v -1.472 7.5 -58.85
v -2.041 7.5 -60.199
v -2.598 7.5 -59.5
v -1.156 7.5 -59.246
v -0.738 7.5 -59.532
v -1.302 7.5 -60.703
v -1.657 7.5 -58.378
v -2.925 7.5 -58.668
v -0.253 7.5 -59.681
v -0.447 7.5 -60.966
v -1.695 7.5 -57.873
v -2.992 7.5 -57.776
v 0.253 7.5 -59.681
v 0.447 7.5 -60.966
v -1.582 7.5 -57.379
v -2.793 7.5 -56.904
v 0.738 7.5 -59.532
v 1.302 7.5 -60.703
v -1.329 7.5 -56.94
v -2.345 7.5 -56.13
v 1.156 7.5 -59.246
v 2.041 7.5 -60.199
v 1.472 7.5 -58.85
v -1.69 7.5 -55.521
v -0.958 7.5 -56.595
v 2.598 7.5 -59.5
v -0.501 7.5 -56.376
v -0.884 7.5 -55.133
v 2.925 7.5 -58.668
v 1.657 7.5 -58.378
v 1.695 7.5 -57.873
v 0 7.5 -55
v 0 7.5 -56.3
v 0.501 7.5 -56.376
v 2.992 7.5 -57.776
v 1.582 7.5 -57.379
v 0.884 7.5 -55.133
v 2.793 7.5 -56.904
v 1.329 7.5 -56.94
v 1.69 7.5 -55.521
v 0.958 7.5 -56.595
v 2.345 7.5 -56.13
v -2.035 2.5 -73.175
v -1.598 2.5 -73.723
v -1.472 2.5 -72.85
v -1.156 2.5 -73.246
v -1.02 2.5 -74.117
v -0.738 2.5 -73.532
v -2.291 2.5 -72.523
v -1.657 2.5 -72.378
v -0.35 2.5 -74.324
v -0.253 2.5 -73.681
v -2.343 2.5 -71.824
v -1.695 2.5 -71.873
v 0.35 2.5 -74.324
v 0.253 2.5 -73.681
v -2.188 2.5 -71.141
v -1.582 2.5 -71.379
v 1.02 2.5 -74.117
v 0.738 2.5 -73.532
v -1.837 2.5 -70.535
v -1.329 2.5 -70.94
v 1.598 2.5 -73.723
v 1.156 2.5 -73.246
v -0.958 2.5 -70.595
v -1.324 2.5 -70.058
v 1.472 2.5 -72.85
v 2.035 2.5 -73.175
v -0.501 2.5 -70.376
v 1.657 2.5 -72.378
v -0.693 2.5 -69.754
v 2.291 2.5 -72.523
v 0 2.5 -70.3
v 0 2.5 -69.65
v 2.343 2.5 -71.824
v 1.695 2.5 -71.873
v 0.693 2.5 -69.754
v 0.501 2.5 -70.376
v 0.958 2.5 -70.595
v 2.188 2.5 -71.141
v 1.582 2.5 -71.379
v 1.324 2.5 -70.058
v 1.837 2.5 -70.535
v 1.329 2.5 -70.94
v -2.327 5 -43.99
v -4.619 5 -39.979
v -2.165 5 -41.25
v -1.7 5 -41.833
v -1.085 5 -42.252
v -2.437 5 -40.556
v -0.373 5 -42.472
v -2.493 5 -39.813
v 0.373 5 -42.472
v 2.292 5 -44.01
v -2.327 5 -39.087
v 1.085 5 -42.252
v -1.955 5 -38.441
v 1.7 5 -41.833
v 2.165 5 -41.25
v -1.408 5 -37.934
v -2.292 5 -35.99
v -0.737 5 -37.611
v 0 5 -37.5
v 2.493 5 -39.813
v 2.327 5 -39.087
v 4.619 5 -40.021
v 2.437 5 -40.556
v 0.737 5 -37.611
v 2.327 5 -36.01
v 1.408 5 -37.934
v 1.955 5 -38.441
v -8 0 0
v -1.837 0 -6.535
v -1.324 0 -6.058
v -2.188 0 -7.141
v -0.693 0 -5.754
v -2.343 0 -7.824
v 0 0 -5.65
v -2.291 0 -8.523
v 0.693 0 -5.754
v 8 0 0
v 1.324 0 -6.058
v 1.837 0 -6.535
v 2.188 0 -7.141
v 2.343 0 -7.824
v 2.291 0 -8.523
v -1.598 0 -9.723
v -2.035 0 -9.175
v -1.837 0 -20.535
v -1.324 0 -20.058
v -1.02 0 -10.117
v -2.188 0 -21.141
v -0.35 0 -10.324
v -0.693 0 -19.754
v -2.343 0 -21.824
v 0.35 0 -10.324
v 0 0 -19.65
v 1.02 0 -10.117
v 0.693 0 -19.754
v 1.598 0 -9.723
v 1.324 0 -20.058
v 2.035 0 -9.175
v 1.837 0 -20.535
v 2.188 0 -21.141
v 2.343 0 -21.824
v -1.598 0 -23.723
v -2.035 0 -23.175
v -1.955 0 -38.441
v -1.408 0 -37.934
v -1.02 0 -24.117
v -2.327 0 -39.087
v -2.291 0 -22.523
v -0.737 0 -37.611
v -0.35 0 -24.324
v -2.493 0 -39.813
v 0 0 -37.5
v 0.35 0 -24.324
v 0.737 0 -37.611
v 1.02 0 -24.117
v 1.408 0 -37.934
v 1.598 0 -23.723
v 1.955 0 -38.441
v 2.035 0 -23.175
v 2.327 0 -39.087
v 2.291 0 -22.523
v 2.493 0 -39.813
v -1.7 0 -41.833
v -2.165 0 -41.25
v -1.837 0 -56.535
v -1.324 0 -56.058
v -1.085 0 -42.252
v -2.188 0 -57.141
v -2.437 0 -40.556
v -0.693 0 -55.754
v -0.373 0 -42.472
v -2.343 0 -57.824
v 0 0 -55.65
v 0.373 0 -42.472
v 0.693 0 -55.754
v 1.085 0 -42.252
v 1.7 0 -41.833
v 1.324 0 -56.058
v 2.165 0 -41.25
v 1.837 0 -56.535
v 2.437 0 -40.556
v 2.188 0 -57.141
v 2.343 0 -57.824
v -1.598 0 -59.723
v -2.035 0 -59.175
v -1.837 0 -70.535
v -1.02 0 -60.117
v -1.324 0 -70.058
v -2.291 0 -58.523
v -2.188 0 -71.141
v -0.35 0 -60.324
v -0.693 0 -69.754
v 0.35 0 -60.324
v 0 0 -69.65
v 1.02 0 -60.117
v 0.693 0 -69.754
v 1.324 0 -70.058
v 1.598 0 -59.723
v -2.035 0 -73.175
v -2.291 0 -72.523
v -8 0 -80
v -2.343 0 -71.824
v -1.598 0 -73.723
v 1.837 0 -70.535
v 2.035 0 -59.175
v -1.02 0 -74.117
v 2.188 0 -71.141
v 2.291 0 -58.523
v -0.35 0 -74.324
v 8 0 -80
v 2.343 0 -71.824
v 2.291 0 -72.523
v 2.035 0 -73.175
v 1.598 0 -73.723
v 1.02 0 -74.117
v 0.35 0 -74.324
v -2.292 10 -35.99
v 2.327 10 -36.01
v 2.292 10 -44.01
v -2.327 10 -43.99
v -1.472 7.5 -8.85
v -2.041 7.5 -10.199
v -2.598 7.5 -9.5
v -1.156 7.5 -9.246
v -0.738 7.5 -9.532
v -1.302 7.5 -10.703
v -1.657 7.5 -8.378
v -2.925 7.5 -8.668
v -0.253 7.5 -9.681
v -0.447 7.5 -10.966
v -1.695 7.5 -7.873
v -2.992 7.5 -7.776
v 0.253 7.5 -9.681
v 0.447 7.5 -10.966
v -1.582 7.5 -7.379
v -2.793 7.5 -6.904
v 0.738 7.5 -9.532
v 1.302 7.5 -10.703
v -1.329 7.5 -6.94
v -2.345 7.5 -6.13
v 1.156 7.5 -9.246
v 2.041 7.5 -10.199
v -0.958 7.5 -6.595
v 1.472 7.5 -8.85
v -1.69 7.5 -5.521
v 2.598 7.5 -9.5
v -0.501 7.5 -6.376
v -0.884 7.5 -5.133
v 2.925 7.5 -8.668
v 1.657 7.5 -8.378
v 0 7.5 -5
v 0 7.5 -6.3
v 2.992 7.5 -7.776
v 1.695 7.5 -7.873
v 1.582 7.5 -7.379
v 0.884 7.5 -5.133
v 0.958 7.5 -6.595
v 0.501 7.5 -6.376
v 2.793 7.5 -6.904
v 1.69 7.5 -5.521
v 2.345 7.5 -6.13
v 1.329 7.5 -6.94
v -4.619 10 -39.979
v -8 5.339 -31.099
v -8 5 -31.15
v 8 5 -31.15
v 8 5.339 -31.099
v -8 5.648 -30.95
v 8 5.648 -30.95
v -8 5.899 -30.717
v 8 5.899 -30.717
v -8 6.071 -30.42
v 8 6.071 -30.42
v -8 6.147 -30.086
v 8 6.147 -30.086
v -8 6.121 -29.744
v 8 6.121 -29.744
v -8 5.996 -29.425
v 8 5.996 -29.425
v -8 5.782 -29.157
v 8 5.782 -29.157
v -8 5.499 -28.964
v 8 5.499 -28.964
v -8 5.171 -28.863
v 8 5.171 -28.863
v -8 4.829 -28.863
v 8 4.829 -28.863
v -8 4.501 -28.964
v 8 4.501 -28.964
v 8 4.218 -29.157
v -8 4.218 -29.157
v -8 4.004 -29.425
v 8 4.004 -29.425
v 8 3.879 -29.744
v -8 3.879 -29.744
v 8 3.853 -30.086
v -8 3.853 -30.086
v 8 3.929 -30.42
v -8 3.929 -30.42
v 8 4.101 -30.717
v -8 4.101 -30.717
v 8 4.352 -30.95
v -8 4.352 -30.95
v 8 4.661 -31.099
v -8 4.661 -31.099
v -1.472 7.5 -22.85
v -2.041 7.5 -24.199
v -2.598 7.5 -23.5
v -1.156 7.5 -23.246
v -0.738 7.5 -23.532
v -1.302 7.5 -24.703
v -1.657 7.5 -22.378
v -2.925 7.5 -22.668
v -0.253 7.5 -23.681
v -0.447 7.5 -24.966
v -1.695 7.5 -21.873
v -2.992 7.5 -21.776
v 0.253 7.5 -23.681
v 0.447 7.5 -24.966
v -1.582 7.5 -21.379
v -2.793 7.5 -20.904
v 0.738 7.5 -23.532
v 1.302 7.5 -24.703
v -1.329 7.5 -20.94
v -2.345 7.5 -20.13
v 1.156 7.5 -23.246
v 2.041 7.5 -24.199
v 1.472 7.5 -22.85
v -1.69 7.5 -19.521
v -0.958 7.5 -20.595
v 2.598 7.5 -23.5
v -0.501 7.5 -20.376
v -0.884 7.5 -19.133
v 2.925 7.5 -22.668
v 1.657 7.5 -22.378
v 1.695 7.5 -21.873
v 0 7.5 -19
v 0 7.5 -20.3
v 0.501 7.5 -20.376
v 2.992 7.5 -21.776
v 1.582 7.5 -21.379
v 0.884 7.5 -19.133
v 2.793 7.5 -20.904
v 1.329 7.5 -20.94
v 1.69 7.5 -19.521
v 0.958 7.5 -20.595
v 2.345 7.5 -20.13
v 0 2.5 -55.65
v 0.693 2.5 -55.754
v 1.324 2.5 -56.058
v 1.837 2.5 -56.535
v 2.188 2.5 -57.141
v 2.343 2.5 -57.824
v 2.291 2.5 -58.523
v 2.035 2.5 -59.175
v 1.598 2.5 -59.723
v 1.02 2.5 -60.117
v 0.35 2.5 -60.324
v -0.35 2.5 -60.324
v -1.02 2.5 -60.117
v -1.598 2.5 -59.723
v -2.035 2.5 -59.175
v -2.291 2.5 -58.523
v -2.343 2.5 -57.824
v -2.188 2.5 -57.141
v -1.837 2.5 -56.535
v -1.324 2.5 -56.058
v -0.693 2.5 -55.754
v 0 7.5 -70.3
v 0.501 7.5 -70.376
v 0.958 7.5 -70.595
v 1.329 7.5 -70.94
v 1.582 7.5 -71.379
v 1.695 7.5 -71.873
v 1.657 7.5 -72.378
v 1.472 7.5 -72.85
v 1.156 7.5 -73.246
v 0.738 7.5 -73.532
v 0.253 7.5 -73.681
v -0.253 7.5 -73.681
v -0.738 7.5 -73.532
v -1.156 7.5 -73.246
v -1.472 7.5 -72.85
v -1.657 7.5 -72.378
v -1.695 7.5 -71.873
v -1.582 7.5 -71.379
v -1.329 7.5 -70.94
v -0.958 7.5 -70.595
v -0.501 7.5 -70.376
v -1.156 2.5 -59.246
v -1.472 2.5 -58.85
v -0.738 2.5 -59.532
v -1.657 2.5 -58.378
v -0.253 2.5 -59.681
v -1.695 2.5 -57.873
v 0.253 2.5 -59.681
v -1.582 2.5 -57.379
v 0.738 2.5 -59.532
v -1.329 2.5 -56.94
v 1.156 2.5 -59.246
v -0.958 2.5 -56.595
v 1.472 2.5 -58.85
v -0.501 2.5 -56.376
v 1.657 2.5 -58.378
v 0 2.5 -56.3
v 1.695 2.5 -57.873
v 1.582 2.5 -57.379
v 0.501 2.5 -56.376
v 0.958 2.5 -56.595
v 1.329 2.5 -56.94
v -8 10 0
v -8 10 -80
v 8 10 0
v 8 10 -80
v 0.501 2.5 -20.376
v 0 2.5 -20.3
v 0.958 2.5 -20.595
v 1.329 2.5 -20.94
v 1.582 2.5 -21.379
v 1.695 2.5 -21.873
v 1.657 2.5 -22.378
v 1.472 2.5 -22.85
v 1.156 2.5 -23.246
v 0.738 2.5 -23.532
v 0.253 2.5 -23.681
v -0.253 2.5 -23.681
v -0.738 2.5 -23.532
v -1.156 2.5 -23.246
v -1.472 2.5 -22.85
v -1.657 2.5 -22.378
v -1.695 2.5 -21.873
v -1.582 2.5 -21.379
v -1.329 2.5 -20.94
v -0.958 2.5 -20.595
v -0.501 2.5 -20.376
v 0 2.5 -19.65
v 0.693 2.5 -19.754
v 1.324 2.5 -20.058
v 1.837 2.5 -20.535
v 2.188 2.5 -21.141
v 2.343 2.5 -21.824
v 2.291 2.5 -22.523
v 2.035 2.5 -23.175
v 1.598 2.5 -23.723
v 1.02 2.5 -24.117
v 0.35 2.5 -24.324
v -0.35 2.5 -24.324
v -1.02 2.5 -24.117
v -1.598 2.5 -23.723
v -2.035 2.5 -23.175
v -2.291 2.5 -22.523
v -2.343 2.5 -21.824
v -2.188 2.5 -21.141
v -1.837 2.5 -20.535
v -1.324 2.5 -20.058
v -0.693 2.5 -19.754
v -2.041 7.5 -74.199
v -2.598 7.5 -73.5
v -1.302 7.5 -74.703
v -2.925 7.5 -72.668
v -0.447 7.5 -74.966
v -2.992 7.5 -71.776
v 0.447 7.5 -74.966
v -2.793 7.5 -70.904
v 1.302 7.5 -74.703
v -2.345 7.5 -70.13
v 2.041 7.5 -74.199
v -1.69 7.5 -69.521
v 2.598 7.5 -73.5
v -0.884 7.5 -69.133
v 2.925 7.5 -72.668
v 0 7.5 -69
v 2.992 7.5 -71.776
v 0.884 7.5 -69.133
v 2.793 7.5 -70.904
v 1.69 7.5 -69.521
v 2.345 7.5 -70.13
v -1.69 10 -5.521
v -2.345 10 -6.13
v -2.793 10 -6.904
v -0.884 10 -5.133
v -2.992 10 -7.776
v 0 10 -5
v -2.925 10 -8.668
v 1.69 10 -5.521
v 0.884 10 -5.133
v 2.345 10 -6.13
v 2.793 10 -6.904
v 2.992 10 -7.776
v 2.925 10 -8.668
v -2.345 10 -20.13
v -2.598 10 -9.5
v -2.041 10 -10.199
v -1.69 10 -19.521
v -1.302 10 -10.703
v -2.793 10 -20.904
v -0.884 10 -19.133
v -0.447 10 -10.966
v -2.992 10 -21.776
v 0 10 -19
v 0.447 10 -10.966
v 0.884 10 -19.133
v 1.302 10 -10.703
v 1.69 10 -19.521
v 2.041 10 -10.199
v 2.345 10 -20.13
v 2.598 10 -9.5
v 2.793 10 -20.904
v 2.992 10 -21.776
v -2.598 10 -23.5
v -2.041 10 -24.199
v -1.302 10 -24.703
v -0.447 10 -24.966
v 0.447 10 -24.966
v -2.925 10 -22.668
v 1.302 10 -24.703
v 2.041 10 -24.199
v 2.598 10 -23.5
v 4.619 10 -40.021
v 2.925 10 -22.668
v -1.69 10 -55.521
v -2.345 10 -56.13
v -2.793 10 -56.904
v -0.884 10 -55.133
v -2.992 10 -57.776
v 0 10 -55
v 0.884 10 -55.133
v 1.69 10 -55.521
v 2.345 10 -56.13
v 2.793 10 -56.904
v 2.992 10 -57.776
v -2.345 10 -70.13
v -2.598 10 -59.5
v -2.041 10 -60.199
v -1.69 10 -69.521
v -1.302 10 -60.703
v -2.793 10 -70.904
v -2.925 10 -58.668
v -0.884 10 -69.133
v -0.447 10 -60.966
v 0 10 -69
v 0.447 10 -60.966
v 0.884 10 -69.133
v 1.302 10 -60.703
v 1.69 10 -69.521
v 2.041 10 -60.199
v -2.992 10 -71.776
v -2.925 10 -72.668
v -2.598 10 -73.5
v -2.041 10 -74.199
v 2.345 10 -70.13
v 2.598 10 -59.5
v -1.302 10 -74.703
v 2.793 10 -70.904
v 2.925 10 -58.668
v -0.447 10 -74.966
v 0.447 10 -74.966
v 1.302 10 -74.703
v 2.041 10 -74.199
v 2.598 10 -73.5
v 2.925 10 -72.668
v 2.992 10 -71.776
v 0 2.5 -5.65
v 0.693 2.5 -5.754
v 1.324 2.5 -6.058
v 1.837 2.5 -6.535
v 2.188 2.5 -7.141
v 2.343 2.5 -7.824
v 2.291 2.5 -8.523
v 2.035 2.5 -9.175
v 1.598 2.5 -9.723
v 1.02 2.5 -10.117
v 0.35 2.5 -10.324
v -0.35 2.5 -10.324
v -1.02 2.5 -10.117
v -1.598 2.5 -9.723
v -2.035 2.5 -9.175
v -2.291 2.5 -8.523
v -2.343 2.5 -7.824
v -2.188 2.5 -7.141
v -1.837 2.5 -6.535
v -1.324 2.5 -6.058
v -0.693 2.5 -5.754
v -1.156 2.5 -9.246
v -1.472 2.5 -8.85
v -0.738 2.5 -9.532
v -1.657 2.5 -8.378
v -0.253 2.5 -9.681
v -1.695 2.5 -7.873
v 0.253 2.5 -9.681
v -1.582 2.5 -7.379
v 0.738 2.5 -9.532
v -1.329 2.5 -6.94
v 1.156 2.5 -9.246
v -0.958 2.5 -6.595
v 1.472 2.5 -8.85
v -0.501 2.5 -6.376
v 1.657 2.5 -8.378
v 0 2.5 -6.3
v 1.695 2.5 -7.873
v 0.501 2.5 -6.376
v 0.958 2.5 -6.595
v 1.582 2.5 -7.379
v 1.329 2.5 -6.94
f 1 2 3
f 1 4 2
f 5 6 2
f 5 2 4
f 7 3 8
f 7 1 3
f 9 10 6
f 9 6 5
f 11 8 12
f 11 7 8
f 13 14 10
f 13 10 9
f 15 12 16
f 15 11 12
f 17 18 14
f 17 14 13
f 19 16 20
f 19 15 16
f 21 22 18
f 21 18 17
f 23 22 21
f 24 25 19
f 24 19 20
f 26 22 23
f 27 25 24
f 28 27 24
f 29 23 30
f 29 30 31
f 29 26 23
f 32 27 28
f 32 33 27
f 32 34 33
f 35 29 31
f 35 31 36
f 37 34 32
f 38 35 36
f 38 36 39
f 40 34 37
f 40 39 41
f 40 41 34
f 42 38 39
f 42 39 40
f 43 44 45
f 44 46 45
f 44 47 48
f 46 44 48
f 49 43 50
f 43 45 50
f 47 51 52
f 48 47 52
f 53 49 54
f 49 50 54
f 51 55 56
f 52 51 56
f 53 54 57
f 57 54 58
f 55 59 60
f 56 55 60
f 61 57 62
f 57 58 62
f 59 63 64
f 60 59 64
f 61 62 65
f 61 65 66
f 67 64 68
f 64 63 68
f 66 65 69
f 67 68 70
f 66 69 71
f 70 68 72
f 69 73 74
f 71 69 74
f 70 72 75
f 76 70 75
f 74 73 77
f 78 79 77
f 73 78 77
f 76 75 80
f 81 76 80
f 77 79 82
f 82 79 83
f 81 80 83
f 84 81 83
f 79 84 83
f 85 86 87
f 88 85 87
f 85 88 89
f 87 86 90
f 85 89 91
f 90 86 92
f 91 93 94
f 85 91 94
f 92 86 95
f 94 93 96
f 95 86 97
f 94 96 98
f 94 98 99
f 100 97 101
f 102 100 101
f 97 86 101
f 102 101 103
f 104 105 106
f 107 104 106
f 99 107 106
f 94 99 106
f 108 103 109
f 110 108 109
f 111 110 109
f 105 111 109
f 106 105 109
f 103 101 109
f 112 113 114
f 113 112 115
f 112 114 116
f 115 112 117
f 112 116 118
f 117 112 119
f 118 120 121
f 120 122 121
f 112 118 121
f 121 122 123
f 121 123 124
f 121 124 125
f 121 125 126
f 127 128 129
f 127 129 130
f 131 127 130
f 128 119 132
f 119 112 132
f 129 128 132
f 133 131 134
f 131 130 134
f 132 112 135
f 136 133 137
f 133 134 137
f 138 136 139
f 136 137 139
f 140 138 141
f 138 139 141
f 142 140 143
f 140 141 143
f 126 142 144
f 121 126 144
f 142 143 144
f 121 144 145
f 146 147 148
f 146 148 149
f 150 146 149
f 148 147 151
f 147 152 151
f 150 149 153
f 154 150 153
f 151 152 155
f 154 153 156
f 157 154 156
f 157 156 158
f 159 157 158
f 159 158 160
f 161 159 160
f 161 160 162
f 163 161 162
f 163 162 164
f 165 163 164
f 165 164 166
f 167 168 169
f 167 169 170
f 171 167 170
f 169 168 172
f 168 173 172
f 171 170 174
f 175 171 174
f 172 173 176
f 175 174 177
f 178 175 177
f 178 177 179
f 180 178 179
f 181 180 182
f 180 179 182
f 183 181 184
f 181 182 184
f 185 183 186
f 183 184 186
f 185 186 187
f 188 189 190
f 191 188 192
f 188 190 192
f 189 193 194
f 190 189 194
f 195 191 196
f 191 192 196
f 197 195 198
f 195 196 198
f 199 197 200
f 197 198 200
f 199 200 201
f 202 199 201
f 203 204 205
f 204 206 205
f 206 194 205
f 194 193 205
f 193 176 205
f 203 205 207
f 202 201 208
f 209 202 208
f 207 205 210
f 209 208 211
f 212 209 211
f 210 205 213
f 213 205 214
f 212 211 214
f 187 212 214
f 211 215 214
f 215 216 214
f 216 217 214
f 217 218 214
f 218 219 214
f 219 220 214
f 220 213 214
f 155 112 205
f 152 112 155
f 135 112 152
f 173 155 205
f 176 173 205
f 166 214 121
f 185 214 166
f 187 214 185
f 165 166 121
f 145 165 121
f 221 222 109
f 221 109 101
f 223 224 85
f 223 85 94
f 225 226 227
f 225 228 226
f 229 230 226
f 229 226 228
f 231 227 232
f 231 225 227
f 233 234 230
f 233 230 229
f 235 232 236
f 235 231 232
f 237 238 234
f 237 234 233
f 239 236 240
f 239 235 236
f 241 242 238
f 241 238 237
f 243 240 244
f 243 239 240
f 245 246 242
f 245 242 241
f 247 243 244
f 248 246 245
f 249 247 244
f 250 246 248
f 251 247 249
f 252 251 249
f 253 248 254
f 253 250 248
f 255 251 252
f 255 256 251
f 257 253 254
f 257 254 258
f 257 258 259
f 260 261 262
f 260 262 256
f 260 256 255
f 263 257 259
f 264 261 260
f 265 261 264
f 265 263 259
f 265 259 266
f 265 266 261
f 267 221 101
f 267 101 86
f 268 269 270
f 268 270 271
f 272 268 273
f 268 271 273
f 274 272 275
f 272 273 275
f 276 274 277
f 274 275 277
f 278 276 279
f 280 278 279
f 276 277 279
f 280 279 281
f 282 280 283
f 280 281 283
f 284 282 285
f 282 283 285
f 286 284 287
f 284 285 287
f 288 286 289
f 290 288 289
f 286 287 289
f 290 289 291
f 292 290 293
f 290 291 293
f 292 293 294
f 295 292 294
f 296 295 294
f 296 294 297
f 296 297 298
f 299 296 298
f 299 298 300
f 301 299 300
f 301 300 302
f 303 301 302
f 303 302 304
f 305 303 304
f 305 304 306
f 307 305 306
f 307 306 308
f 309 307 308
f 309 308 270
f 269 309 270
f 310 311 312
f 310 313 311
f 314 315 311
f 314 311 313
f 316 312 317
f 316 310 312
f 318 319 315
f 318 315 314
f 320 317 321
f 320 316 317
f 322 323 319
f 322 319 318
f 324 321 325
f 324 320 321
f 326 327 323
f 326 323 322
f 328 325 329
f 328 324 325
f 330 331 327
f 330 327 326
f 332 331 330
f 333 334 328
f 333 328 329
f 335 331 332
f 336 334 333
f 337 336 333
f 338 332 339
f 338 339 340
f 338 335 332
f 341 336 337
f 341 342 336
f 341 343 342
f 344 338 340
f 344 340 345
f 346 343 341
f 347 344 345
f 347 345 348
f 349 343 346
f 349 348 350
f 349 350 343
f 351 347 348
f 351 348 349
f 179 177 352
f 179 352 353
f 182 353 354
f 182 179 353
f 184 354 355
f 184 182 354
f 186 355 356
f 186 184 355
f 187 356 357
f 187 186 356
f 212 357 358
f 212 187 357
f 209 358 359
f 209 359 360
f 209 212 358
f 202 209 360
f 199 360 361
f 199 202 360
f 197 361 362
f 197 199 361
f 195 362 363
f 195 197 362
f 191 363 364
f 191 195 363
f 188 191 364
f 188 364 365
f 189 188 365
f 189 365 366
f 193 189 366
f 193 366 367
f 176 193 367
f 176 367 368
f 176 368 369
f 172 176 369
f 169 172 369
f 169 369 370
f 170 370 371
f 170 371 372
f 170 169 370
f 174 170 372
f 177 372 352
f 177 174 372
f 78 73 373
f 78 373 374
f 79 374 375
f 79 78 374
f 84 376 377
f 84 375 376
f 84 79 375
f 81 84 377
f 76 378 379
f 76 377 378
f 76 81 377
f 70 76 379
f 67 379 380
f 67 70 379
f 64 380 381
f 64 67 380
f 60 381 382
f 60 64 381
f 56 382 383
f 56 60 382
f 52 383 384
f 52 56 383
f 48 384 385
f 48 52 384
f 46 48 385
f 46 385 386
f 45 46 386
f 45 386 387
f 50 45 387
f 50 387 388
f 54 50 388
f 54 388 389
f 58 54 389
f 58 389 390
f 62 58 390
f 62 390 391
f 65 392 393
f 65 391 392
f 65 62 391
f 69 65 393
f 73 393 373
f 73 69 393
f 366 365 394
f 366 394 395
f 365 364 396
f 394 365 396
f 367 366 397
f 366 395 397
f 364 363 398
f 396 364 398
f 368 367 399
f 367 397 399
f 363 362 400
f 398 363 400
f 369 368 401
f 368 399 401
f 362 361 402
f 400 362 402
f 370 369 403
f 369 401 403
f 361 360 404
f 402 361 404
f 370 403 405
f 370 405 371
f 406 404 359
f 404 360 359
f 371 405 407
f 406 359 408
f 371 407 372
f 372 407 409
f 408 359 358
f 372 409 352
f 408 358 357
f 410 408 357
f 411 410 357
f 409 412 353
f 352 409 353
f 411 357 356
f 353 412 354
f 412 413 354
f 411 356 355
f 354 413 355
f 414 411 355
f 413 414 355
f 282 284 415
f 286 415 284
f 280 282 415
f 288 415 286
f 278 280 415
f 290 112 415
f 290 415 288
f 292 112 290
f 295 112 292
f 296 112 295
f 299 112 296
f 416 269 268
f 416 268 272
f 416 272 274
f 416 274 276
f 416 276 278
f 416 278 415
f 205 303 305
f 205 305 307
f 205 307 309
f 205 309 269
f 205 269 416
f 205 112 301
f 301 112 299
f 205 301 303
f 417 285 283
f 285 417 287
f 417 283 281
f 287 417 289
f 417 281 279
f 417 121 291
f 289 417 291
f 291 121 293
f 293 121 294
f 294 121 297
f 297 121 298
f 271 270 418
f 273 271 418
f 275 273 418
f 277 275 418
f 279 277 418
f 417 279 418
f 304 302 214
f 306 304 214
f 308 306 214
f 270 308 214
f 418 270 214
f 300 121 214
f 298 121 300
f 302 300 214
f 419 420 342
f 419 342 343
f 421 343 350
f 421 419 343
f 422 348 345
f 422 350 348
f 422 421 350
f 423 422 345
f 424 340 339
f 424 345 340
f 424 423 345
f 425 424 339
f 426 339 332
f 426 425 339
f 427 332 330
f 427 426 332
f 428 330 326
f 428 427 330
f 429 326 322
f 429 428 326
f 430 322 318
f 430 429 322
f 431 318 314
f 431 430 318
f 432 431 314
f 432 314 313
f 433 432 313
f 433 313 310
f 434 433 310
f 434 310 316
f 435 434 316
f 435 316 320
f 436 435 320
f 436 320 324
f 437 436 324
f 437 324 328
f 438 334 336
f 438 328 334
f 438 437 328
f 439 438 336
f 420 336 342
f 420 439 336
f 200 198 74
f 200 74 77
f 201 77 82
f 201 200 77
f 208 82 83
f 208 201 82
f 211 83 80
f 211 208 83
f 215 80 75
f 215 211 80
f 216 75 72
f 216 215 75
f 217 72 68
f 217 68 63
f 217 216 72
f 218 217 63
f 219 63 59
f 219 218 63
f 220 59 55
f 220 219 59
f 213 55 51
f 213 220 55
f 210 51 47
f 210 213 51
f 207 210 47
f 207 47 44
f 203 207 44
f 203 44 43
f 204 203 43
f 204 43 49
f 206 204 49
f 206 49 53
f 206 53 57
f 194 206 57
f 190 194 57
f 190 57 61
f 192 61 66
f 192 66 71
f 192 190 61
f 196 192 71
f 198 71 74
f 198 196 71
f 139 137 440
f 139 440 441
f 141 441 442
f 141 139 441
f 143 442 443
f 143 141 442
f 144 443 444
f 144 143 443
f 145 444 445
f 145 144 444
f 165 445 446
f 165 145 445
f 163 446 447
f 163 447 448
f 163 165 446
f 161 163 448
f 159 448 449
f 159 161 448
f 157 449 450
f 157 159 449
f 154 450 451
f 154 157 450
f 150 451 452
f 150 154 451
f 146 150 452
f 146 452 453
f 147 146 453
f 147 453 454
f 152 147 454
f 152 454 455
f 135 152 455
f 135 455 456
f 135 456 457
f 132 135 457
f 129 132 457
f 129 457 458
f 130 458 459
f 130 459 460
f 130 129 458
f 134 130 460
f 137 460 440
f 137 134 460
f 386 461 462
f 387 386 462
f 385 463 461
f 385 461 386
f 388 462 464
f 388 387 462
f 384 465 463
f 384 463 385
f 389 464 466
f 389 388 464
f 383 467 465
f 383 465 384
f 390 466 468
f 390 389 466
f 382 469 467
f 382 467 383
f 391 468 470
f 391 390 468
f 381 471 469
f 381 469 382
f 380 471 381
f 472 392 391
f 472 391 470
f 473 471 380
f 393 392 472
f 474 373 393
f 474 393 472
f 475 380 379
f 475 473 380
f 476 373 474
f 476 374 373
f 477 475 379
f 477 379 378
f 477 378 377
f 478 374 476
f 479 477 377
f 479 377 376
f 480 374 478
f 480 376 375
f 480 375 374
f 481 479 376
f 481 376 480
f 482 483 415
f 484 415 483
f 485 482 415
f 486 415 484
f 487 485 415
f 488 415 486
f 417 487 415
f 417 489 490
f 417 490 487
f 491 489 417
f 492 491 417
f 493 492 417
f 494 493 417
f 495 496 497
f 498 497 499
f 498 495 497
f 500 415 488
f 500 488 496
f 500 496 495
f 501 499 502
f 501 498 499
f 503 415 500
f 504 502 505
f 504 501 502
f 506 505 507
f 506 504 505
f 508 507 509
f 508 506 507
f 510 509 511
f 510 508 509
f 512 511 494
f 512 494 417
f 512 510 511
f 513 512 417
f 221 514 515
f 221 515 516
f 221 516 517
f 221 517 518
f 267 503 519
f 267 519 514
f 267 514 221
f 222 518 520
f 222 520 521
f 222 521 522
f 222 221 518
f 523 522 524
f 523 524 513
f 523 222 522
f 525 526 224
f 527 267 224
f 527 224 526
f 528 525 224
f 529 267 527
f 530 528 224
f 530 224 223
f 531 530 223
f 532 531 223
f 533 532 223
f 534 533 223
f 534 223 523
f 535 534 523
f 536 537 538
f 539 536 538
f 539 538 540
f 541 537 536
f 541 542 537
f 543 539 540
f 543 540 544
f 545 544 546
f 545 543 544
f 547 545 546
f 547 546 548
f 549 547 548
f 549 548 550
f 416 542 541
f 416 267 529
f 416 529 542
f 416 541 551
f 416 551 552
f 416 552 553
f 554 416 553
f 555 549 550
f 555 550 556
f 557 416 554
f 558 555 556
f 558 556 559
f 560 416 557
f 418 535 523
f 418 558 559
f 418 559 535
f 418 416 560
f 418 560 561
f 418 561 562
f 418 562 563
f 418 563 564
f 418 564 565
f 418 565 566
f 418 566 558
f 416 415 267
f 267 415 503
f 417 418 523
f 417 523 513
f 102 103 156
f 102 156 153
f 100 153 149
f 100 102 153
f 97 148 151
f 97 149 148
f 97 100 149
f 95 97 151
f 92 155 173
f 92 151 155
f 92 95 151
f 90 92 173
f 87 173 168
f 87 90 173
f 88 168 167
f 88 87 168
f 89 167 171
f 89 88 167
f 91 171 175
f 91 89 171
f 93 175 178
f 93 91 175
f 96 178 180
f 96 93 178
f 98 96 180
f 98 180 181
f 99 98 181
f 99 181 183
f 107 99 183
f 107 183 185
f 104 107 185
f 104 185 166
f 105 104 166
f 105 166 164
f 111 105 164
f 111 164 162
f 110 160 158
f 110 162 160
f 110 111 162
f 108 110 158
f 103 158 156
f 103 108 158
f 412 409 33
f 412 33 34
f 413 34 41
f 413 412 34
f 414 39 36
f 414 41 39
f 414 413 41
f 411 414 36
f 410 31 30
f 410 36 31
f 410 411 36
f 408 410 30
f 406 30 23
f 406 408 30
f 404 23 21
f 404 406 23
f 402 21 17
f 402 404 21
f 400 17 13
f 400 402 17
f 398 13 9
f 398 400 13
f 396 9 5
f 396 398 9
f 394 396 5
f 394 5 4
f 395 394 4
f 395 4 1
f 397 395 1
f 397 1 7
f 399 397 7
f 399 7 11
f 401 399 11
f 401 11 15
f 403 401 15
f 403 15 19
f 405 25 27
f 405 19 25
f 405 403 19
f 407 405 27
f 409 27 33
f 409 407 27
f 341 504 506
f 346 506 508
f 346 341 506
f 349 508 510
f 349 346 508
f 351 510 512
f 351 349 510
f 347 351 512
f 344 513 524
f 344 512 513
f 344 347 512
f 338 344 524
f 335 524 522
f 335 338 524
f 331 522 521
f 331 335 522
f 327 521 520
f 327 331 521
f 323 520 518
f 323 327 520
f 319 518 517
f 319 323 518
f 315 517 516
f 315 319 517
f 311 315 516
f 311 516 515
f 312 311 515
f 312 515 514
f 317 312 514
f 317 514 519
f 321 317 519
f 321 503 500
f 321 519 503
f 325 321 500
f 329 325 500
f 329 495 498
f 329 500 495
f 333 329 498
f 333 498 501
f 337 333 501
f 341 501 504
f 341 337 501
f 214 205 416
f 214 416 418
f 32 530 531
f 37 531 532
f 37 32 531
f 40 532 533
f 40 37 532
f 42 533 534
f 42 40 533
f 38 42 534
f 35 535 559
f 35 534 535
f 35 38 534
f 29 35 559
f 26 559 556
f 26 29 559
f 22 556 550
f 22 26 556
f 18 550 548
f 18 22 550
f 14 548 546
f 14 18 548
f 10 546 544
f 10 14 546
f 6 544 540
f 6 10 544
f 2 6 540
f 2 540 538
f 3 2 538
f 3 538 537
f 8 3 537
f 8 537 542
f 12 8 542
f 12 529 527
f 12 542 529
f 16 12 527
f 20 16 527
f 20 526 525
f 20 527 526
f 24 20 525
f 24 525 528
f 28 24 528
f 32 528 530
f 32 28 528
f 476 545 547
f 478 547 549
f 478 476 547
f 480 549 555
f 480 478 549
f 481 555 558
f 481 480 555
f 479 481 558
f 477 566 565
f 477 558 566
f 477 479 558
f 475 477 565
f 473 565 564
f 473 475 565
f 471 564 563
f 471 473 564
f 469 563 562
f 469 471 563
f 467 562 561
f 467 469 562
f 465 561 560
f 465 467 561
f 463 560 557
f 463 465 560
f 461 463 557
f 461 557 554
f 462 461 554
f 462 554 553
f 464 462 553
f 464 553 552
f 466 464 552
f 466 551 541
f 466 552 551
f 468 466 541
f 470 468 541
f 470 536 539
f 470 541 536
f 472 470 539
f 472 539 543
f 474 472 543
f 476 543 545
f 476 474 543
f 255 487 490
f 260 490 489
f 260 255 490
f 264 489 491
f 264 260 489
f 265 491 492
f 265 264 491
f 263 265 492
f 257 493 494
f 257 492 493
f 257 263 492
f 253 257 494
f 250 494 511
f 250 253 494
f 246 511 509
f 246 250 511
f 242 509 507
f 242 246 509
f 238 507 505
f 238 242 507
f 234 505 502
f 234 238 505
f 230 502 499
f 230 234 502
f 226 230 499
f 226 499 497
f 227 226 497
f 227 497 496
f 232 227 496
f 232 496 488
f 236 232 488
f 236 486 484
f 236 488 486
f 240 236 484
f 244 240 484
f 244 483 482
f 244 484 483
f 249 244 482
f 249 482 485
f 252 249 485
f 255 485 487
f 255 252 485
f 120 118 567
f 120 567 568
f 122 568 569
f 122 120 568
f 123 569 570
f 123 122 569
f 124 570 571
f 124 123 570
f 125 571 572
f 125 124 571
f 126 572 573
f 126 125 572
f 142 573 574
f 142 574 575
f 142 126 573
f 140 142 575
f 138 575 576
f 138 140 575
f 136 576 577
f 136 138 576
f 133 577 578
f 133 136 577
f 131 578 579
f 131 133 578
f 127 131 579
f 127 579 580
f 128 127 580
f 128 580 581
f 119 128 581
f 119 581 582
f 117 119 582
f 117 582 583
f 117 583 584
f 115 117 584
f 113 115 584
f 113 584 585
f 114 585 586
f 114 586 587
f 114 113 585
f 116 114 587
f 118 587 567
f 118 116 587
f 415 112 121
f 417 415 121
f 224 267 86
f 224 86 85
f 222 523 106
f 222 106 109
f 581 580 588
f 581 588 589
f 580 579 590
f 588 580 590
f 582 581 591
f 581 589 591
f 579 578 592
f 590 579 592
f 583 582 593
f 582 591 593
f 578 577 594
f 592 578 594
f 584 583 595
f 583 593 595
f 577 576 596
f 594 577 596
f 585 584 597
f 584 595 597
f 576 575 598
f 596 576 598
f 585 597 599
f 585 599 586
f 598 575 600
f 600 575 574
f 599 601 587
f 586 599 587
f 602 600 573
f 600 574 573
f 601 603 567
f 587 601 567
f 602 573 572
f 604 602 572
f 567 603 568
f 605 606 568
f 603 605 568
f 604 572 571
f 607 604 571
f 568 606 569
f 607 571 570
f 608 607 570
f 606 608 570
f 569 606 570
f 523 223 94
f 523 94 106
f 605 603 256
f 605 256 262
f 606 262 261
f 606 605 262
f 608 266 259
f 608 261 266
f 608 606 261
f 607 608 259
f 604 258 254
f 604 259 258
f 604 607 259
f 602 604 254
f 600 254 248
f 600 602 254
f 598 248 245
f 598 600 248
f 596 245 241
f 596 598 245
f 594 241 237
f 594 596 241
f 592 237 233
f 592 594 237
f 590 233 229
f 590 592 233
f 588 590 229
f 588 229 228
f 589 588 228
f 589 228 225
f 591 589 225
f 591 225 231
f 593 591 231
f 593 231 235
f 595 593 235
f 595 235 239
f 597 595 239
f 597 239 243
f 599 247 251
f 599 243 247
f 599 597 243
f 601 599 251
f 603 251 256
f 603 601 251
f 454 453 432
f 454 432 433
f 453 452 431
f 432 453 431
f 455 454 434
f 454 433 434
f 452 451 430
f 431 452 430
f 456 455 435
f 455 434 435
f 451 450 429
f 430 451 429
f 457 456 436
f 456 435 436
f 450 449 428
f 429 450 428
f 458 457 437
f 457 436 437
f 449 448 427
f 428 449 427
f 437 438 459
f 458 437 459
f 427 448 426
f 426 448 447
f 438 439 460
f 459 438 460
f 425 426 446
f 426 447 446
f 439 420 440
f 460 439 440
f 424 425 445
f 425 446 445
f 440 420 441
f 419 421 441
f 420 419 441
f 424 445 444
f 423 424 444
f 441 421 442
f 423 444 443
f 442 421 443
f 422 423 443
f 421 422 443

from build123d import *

# Parameters (mm, degrees)
SKETCH1_W           = 16
SKETCH1_H           = 80
BOSS_EXTRUDE1_DEPTH = 10
SKETCH2_R           = 2.35
CUT_EXTRUDE1_DEPTH  = 2.5
SKETCH2_3_R         = 1.7
CUT_EXTRUDE2_DEPTH  = 82.018516402
CUT_EXTRUDE3_START  = 7.5
SKETCH2_4_R         = 3
CUT_EXTRUDE3_DEPTH  = 74.518516402
SKETCH3_R           = 1.15
CUT_EXTRUDE4_DEPTH  = 83.194890352
CUT_EXTRUDE5_DEPTH  = 5
SKETCH6_R           = 2.5
CUT_EXTRUDE6_DEPTH  = 25


with BuildPart() as part:
    # Sketch1 → Boss-Extrude1 (new body)
    with BuildSketch(Plane(origin=(0, 0, 0), x_dir=(1, 0, 0), z_dir=(0, 1, 0))):
        with Locations((0, 40)):
            Rectangle(SKETCH1_W, SKETCH1_H)
    extrude(amount=BOSS_EXTRUDE1_DEPTH)

    # Sketch2 → Cut-Extrude1 (cut)
    with BuildSketch(Plane(origin=(0, 0, 0), x_dir=(1, 0, 0), z_dir=(0, 1, 0))):
        with Locations((0, 72)):
            Circle(SKETCH2_R)
        with Locations((0, 58)):
            Circle(SKETCH2_R)
        with Locations((0, 22)):
            Circle(SKETCH2_R)
        with Locations((0, 8)):
            Circle(SKETCH2_R)
    extrude(amount=CUT_EXTRUDE1_DEPTH, mode=Mode.SUBTRACT)

    # Sketch2<3> → Cut-Extrude2 (cut, through all)
    with BuildSketch(Plane(origin=(0, 0, 0), x_dir=(1, 0, 0), z_dir=(0, 1, 0))):
        with Locations((0, 72)):
            Circle(SKETCH2_3_R)
        with Locations((0, 58)):
            Circle(SKETCH2_3_R)
        with Locations((0, 22)):
            Circle(SKETCH2_3_R)
        with Locations((0, 8)):
            Circle(SKETCH2_3_R)
    extrude(amount=CUT_EXTRUDE2_DEPTH, mode=Mode.SUBTRACT)

    # Sketch2<4> → Cut-Extrude3 (cut, through all)
    with BuildSketch(Plane(origin=(0, 0, 0), x_dir=(1, 0, 0), z_dir=(0, 1, 0)).offset(CUT_EXTRUDE3_START)):
        with Locations((0, 72)):
            Circle(SKETCH2_4_R)
        with Locations((0, 58)):
            Circle(SKETCH2_4_R)
        with Locations((0, 22)):
            Circle(SKETCH2_4_R)
        with Locations((0, 8)):
            Circle(SKETCH2_4_R)
    extrude(amount=CUT_EXTRUDE3_DEPTH, mode=Mode.SUBTRACT)

    # Sketch3 → Cut-Extrude4 (cut, through all)
    with BuildSketch(Plane(origin=(8, 0, 0), x_dir=(0, 0, -1), z_dir=(1, 0, 0))):
        with Locations((30, 5)):
            Circle(SKETCH3_R)
    extrude(amount=-CUT_EXTRUDE4_DEPTH, mode=Mode.SUBTRACT)

    # Sketch4 → Cut-Extrude5 (cut)
    with BuildSketch(Plane.XZ.offset(-10)):
        Polygon((2.291567597, -44.010243295), (4.618756367, -40.020565894), (2.32718877, -36.010322599), (-2.291567597, -35.989756705), (-4.618756367, -39.979434106), (-2.32718877, -43.989677401), align=None)
    extrude(amount=CUT_EXTRUDE5_DEPTH, mode=Mode.SUBTRACT)

    # Sketch6 → Cut-Extrude6 (cut)
    with BuildSketch(Plane(origin=(0, 10, 0), x_dir=(-1, 0, 0), z_dir=(0, -1, 0))):
        with Locations((0, 40)):
            Circle(SKETCH6_R)
    extrude(amount=CUT_EXTRUDE6_DEPTH, mode=Mode.SUBTRACT)


solid = part.part
